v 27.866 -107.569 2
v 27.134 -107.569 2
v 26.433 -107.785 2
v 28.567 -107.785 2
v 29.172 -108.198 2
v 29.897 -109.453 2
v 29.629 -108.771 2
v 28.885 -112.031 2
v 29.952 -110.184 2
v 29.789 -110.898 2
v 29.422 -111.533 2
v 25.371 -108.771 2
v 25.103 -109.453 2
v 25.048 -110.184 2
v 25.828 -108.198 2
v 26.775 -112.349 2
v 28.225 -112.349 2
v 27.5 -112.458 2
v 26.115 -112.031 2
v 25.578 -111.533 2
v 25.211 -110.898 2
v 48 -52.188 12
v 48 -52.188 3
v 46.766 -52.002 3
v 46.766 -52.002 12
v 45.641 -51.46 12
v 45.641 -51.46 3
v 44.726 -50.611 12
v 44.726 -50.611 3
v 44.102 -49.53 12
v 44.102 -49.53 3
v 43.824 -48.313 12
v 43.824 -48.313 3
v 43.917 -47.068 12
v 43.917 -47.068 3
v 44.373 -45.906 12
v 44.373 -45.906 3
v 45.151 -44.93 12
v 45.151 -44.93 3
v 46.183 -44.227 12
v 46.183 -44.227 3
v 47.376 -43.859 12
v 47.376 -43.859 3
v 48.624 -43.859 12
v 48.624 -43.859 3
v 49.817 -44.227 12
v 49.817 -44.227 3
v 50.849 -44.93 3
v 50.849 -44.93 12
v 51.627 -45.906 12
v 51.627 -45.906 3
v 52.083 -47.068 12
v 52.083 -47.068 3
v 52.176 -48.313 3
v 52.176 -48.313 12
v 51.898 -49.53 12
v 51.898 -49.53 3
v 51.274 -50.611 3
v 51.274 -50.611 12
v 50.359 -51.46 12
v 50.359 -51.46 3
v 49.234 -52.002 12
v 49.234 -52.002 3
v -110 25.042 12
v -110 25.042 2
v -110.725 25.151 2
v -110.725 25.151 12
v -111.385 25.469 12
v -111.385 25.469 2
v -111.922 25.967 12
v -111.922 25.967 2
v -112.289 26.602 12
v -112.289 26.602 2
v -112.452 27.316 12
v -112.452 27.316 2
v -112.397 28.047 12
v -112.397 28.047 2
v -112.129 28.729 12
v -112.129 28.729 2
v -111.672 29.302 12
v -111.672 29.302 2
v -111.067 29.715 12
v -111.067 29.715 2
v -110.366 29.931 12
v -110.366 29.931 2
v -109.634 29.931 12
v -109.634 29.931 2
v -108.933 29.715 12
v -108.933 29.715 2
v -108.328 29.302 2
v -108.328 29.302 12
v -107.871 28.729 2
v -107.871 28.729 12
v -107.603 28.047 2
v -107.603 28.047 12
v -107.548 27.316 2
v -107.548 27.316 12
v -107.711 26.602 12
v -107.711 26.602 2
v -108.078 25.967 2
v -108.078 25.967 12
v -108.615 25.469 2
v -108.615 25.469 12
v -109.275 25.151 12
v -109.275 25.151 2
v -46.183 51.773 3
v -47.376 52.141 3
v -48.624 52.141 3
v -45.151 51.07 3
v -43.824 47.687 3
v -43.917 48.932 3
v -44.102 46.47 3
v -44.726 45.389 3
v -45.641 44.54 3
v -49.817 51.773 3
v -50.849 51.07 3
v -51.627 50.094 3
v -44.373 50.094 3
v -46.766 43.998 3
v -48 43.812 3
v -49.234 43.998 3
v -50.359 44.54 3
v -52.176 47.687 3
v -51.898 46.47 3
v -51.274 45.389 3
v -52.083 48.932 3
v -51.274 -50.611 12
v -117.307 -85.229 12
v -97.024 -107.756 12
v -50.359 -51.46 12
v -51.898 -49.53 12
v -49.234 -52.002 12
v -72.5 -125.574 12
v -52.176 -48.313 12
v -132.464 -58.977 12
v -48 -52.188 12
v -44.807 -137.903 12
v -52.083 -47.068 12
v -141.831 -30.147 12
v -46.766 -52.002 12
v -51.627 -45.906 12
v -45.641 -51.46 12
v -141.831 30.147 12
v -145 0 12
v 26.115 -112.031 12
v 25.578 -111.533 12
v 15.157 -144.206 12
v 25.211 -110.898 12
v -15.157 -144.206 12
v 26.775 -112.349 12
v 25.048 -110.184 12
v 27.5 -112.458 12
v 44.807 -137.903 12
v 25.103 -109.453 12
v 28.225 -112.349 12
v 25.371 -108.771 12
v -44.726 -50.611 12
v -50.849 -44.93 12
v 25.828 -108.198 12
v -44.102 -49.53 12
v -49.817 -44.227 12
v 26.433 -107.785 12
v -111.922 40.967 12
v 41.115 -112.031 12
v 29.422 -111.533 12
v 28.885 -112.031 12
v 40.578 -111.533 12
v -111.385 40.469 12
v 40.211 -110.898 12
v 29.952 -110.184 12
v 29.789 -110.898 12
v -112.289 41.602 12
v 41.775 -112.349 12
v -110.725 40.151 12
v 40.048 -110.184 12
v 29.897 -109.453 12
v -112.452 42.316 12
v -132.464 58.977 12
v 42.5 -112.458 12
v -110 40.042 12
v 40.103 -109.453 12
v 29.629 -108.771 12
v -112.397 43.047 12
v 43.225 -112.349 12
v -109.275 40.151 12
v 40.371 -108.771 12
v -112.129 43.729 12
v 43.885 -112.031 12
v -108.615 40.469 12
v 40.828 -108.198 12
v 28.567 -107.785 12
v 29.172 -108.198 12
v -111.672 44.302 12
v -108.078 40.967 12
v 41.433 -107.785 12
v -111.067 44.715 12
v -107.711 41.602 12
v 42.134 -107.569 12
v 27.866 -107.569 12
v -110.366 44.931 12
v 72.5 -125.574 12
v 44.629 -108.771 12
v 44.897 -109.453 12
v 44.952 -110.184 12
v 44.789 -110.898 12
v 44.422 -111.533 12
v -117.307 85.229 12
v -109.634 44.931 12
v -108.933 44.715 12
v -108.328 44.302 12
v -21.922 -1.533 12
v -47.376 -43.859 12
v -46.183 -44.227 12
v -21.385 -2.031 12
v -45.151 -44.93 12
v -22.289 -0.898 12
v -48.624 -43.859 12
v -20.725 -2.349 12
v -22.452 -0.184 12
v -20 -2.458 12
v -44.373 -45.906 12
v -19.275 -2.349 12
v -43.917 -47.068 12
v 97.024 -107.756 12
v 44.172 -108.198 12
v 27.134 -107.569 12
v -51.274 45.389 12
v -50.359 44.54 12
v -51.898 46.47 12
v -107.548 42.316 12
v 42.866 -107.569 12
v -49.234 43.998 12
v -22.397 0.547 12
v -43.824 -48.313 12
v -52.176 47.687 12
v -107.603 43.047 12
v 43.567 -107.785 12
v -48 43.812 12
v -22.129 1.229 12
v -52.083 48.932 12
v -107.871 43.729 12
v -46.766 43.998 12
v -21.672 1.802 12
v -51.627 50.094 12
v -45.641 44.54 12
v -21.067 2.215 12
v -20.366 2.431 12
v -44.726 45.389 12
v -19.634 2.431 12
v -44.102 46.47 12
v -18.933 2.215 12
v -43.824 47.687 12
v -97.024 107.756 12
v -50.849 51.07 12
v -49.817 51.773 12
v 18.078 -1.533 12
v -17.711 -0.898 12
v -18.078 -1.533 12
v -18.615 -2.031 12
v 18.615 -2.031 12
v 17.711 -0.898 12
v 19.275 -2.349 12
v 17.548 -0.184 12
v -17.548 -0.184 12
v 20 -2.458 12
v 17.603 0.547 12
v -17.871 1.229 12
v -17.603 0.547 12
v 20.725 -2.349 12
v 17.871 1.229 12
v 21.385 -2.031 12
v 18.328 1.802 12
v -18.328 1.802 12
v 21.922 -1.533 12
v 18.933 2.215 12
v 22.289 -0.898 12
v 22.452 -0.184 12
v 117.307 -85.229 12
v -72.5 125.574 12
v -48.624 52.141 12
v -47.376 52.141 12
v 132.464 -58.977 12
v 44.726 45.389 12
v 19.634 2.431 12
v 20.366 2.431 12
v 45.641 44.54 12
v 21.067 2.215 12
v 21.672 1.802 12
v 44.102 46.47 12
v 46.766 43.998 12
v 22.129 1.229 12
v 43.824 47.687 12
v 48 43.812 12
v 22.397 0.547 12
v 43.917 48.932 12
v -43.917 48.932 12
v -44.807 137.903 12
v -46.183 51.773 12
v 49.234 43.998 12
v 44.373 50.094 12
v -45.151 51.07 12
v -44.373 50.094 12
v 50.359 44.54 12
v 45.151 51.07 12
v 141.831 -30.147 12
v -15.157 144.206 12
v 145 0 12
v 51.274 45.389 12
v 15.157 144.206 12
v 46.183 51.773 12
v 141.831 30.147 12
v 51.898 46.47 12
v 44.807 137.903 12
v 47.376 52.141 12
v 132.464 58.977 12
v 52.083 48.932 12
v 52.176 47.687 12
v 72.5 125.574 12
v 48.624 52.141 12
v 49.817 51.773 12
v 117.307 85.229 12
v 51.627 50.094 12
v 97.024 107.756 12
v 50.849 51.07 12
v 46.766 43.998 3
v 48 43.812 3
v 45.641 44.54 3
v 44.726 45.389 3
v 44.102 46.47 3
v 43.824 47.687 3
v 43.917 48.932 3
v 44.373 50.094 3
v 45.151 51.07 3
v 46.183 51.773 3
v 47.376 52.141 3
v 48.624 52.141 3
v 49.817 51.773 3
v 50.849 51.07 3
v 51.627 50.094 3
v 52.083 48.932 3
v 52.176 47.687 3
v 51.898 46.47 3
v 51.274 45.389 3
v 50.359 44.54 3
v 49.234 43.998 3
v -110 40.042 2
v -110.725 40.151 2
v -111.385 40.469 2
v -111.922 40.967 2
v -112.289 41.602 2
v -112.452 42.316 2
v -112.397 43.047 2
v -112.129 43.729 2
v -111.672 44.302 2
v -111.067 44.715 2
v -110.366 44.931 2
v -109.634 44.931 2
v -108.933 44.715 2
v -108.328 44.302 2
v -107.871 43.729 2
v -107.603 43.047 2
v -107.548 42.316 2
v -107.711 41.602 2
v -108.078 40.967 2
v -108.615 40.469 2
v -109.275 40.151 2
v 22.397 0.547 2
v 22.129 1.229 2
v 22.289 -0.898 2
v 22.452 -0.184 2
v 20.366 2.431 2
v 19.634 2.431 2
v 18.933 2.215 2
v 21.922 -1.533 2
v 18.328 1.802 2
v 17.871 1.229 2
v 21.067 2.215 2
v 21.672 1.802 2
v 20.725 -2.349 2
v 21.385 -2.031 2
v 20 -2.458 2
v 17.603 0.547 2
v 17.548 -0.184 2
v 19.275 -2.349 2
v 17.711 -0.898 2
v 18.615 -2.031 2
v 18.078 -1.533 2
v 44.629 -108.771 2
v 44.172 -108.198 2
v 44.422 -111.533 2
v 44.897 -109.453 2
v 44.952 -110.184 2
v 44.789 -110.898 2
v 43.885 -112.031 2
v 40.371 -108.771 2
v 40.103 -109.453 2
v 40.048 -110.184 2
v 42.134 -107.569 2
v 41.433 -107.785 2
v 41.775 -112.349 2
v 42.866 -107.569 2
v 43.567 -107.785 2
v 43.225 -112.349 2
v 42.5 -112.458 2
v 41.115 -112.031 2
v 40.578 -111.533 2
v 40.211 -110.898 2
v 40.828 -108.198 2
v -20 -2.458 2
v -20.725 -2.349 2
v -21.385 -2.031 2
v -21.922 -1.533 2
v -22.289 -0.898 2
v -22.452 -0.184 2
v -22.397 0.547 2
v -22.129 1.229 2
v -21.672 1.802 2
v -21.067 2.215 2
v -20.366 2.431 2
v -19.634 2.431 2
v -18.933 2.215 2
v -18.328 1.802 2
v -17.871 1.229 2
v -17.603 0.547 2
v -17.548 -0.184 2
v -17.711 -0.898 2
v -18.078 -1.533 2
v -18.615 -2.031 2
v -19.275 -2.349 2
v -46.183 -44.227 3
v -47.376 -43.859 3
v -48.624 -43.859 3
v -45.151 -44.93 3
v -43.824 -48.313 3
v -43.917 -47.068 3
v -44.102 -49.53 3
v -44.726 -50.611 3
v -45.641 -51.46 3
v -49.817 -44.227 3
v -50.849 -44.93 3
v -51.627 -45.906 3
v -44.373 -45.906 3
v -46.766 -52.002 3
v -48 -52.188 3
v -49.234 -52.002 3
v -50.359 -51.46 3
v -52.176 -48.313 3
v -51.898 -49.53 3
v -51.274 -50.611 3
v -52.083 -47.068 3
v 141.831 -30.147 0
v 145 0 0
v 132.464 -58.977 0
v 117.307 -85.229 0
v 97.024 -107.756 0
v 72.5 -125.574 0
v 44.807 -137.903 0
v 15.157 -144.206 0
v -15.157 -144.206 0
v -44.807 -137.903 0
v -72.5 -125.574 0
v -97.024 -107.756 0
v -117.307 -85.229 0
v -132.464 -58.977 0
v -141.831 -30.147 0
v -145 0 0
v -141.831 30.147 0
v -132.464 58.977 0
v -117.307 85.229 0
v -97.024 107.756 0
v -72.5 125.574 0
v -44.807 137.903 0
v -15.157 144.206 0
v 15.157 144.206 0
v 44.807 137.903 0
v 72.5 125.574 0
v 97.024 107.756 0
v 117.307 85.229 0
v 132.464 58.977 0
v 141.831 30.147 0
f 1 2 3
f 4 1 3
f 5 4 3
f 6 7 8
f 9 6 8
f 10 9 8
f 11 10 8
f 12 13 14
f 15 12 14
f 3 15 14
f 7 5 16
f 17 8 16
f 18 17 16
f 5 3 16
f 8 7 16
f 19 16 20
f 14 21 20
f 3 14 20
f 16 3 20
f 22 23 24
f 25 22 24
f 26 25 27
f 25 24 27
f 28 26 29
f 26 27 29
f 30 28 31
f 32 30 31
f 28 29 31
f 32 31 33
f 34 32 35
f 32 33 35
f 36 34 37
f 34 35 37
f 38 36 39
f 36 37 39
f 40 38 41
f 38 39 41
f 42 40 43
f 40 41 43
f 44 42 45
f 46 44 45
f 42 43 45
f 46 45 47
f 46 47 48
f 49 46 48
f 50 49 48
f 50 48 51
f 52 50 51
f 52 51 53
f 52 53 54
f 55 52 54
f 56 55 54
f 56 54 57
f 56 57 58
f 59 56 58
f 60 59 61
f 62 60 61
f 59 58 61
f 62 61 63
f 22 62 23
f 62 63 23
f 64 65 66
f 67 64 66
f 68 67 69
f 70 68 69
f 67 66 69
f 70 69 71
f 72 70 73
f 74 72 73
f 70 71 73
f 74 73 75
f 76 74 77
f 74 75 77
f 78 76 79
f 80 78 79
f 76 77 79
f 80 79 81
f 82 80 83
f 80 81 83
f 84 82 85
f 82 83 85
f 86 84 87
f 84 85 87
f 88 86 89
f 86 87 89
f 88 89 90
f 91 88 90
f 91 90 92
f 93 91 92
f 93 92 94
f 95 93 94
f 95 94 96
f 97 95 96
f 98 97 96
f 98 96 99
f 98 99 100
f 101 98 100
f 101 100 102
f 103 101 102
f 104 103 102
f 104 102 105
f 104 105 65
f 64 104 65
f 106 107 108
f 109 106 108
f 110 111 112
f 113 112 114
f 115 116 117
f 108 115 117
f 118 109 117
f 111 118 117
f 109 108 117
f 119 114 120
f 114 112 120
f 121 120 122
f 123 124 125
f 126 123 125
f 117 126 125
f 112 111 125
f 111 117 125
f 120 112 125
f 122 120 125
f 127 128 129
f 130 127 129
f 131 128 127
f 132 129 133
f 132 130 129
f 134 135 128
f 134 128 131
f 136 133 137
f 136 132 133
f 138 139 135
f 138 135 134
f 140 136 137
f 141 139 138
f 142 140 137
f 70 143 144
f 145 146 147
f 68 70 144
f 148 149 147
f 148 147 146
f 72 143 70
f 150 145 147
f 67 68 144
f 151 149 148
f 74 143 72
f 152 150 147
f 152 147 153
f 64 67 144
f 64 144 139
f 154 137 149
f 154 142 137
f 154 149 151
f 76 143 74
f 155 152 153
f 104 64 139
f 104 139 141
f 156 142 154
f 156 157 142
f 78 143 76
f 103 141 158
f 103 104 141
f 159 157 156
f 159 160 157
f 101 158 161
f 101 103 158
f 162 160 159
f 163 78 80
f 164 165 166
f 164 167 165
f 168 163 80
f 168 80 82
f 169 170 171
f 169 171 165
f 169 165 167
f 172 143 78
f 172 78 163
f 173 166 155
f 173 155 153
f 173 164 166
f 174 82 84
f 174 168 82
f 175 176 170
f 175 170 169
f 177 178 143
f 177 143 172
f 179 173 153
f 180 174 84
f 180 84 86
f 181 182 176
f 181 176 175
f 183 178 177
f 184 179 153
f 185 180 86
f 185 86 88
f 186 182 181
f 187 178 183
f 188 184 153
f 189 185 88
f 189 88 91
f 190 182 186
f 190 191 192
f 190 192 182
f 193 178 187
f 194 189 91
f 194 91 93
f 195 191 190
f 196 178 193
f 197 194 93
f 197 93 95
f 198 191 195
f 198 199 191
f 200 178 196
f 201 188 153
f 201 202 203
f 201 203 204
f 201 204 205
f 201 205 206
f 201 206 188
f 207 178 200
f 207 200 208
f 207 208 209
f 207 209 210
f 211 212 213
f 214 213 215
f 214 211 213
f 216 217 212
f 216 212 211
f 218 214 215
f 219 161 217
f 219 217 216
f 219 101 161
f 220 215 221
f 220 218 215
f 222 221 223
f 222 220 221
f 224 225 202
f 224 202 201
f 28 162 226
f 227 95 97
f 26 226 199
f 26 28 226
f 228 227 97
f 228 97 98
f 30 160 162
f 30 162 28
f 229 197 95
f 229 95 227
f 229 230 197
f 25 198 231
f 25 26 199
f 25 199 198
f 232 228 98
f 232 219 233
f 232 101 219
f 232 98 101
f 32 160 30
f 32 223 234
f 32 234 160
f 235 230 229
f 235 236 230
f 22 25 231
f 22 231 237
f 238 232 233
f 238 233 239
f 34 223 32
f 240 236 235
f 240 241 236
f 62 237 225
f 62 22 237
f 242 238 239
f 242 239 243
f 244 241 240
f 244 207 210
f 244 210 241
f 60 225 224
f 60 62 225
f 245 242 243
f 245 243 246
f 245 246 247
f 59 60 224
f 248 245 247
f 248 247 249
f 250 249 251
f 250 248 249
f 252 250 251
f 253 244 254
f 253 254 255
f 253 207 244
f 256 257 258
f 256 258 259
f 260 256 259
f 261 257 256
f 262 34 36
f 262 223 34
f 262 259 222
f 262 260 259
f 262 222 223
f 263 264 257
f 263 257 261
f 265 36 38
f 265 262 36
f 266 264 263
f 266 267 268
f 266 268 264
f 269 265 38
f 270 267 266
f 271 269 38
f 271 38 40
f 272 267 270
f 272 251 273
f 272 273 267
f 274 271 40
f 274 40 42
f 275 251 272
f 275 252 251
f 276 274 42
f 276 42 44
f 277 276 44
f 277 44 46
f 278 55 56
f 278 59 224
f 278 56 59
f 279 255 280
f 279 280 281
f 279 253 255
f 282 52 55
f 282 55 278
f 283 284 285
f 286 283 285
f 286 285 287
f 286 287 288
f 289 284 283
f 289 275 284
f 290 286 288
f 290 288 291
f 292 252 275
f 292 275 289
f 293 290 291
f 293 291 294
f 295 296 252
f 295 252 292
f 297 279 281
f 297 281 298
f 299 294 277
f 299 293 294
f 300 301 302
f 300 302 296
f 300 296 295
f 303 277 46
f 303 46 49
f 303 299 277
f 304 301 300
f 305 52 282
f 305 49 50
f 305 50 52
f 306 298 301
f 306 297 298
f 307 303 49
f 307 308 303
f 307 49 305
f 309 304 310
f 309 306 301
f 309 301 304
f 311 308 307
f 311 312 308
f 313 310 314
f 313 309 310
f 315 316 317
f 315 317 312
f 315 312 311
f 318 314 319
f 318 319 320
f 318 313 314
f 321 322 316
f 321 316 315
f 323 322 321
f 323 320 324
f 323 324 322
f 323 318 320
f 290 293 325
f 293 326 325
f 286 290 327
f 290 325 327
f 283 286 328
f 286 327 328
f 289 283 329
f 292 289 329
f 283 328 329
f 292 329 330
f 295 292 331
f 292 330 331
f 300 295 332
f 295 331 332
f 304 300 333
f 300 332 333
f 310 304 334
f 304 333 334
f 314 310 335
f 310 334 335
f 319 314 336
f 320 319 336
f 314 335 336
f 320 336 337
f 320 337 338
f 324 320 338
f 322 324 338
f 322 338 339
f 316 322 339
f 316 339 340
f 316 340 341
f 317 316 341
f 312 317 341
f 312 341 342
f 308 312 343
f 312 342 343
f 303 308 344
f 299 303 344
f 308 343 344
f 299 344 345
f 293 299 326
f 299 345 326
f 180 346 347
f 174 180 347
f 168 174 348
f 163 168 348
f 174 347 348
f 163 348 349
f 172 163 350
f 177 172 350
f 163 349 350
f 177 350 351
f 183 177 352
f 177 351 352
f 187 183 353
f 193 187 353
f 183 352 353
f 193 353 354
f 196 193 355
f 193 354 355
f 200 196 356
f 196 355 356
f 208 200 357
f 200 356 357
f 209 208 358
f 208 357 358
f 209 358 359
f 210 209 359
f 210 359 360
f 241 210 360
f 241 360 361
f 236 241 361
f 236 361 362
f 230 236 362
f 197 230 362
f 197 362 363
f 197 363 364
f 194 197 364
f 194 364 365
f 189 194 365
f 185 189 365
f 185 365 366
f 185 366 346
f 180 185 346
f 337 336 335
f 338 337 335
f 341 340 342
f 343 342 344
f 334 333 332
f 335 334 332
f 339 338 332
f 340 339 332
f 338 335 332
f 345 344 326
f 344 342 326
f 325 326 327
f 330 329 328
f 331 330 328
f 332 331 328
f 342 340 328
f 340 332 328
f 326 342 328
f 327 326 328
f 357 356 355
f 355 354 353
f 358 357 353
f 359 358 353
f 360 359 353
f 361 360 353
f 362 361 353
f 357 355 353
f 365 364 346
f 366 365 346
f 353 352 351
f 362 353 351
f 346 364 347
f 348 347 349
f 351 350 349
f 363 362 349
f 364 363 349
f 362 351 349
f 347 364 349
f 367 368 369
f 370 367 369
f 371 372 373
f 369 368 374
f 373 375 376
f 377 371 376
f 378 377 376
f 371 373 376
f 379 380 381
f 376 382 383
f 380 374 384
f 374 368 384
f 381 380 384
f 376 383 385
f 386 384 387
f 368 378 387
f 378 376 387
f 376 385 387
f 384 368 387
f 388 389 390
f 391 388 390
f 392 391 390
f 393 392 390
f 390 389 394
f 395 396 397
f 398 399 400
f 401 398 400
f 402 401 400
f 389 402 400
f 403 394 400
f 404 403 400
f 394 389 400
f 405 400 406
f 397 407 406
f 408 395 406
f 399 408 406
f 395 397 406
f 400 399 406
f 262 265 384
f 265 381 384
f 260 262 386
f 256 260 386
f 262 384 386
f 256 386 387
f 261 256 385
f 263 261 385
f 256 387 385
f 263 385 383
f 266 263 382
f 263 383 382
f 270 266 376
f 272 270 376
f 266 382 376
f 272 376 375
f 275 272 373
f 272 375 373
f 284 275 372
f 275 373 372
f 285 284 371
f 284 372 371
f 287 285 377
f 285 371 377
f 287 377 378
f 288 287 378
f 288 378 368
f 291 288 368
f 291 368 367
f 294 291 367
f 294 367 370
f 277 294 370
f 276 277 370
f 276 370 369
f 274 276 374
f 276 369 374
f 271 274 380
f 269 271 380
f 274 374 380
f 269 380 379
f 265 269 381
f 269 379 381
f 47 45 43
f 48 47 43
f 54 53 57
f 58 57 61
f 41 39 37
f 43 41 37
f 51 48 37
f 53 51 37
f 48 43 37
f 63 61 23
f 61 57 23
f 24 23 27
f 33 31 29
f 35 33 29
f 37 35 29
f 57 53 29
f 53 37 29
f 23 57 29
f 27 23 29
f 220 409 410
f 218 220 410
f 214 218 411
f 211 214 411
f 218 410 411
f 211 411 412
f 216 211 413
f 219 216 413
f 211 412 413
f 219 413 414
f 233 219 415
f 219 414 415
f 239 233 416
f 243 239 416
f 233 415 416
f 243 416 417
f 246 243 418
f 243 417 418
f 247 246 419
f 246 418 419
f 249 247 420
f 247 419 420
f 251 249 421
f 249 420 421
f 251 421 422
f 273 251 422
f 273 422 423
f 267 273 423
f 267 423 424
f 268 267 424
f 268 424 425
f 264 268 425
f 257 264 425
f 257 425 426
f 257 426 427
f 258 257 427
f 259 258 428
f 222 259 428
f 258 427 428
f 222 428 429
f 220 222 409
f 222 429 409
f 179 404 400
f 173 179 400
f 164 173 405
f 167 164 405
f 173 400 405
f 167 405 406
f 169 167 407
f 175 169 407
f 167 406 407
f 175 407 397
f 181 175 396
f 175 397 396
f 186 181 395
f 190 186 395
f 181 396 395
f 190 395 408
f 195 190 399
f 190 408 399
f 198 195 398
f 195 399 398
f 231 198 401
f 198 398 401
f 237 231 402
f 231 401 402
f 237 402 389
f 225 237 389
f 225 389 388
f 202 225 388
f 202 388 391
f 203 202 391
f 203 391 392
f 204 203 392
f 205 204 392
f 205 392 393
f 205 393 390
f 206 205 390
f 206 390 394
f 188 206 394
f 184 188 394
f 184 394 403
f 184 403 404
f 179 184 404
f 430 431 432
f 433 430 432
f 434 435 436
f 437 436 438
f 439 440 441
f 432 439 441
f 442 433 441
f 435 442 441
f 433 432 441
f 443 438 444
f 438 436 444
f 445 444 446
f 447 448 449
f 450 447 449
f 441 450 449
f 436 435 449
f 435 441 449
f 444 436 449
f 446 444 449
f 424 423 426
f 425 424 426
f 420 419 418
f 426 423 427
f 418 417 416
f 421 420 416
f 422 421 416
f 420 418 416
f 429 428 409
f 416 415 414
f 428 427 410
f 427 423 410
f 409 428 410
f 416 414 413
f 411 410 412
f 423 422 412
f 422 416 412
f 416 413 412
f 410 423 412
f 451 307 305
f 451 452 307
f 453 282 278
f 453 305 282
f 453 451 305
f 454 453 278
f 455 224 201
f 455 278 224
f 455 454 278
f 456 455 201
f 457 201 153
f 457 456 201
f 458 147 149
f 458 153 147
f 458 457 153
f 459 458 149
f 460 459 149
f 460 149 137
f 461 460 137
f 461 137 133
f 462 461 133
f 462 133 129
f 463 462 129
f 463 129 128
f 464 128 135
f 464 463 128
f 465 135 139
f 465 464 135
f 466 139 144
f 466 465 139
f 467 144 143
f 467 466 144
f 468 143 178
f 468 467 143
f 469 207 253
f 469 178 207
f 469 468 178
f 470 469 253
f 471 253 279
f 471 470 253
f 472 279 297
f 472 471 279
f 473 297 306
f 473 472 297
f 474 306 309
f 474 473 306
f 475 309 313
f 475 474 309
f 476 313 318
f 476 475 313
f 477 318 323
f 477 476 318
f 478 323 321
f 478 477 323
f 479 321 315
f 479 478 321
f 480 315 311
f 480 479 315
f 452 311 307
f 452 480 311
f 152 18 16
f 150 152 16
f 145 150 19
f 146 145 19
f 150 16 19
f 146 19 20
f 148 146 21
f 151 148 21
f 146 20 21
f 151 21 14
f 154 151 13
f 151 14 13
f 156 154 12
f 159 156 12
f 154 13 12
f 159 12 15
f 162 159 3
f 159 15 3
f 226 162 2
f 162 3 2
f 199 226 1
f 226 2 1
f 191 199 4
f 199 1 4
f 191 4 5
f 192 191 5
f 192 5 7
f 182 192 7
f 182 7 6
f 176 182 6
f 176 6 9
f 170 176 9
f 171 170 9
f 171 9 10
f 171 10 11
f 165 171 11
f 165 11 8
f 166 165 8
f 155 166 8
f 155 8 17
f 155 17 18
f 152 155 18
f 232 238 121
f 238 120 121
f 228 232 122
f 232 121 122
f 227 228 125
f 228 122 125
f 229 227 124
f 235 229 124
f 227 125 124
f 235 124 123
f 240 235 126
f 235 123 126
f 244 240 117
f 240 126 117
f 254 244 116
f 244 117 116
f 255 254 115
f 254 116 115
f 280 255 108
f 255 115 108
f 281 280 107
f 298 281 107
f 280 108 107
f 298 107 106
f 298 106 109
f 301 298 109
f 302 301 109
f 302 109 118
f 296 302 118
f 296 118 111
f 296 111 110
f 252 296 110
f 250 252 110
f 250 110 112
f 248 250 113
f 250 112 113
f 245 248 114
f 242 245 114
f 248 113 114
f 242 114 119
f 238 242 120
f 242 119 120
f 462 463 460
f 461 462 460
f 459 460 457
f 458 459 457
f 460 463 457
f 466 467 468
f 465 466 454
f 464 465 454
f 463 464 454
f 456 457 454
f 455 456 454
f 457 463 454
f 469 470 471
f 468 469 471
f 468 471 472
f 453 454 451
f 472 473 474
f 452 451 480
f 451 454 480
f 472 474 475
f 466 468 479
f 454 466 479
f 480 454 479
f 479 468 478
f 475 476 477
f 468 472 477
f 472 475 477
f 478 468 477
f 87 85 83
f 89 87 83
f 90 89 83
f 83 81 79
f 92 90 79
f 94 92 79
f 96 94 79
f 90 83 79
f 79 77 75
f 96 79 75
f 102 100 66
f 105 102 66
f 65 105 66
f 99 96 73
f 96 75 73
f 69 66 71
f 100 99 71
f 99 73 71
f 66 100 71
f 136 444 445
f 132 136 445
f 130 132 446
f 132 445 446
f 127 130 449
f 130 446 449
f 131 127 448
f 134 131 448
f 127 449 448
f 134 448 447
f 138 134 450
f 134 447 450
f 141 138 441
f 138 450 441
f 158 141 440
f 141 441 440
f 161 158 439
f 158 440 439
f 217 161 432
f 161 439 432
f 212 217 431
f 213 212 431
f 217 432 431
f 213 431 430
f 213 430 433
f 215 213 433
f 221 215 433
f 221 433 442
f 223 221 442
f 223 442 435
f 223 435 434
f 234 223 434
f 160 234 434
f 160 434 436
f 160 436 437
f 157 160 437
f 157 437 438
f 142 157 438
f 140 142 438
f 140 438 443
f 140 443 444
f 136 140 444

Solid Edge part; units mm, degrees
sketch "Sketch1" plane through (0, 0, 0) normal (0, 0, 1) x (1, 0, 0)
  circle A0 centre (0, 0) radius 145
extrude "Protrusion1" add sketch "Sketch1" along normal blind 12
hole "Bohrung_1" at (-20, 0, 12) direction (0, 0, -1) diameter 4.917 depth 10 thread major 6 thread length 8
hole "Hole1" at (20, 0, 12) direction (0, 0, -1) diameter 4.917 depth 10 thread major 6 thread length 8
hole "Bohrung_3" at (-110, 42.5, 12) direction (0, 0, -1) diameter 4.917 depth 10 thread major 6 thread length 8
hole "Hole2" at (-110, 27.5, 12) direction (0, 0, -1) diameter 4.917 depth 10 thread major 6 thread length 8
hole "Bohrung_9" at (42.5, -110, 12) direction (0, 0, -1) diameter 4.917 depth 10 thread major 6 thread length 8
hole "Hole3" at (27.5, -110, 12) direction (0, 0, -1) diameter 4.917 depth 10 thread major 6 thread length 8
hole "Bohrung_11" at (48, -48, 12) direction (0, 0, -1) diameter 8.376 depth 9 thread major 10 thread length 8
hole "Hole4" at (-48, -48, 12) direction (0, 0, -1) diameter 8.376 depth 9 thread major 10 thread length 8
hole "Hole5" at (-48, 48, 12) direction (0, 0, -1) diameter 8.376 depth 9 thread major 10 thread length 8
hole "Hole6" at (48, 48, 12) direction (0, 0, -1) diameter 8.376 depth 9 thread major 10 thread length 8
